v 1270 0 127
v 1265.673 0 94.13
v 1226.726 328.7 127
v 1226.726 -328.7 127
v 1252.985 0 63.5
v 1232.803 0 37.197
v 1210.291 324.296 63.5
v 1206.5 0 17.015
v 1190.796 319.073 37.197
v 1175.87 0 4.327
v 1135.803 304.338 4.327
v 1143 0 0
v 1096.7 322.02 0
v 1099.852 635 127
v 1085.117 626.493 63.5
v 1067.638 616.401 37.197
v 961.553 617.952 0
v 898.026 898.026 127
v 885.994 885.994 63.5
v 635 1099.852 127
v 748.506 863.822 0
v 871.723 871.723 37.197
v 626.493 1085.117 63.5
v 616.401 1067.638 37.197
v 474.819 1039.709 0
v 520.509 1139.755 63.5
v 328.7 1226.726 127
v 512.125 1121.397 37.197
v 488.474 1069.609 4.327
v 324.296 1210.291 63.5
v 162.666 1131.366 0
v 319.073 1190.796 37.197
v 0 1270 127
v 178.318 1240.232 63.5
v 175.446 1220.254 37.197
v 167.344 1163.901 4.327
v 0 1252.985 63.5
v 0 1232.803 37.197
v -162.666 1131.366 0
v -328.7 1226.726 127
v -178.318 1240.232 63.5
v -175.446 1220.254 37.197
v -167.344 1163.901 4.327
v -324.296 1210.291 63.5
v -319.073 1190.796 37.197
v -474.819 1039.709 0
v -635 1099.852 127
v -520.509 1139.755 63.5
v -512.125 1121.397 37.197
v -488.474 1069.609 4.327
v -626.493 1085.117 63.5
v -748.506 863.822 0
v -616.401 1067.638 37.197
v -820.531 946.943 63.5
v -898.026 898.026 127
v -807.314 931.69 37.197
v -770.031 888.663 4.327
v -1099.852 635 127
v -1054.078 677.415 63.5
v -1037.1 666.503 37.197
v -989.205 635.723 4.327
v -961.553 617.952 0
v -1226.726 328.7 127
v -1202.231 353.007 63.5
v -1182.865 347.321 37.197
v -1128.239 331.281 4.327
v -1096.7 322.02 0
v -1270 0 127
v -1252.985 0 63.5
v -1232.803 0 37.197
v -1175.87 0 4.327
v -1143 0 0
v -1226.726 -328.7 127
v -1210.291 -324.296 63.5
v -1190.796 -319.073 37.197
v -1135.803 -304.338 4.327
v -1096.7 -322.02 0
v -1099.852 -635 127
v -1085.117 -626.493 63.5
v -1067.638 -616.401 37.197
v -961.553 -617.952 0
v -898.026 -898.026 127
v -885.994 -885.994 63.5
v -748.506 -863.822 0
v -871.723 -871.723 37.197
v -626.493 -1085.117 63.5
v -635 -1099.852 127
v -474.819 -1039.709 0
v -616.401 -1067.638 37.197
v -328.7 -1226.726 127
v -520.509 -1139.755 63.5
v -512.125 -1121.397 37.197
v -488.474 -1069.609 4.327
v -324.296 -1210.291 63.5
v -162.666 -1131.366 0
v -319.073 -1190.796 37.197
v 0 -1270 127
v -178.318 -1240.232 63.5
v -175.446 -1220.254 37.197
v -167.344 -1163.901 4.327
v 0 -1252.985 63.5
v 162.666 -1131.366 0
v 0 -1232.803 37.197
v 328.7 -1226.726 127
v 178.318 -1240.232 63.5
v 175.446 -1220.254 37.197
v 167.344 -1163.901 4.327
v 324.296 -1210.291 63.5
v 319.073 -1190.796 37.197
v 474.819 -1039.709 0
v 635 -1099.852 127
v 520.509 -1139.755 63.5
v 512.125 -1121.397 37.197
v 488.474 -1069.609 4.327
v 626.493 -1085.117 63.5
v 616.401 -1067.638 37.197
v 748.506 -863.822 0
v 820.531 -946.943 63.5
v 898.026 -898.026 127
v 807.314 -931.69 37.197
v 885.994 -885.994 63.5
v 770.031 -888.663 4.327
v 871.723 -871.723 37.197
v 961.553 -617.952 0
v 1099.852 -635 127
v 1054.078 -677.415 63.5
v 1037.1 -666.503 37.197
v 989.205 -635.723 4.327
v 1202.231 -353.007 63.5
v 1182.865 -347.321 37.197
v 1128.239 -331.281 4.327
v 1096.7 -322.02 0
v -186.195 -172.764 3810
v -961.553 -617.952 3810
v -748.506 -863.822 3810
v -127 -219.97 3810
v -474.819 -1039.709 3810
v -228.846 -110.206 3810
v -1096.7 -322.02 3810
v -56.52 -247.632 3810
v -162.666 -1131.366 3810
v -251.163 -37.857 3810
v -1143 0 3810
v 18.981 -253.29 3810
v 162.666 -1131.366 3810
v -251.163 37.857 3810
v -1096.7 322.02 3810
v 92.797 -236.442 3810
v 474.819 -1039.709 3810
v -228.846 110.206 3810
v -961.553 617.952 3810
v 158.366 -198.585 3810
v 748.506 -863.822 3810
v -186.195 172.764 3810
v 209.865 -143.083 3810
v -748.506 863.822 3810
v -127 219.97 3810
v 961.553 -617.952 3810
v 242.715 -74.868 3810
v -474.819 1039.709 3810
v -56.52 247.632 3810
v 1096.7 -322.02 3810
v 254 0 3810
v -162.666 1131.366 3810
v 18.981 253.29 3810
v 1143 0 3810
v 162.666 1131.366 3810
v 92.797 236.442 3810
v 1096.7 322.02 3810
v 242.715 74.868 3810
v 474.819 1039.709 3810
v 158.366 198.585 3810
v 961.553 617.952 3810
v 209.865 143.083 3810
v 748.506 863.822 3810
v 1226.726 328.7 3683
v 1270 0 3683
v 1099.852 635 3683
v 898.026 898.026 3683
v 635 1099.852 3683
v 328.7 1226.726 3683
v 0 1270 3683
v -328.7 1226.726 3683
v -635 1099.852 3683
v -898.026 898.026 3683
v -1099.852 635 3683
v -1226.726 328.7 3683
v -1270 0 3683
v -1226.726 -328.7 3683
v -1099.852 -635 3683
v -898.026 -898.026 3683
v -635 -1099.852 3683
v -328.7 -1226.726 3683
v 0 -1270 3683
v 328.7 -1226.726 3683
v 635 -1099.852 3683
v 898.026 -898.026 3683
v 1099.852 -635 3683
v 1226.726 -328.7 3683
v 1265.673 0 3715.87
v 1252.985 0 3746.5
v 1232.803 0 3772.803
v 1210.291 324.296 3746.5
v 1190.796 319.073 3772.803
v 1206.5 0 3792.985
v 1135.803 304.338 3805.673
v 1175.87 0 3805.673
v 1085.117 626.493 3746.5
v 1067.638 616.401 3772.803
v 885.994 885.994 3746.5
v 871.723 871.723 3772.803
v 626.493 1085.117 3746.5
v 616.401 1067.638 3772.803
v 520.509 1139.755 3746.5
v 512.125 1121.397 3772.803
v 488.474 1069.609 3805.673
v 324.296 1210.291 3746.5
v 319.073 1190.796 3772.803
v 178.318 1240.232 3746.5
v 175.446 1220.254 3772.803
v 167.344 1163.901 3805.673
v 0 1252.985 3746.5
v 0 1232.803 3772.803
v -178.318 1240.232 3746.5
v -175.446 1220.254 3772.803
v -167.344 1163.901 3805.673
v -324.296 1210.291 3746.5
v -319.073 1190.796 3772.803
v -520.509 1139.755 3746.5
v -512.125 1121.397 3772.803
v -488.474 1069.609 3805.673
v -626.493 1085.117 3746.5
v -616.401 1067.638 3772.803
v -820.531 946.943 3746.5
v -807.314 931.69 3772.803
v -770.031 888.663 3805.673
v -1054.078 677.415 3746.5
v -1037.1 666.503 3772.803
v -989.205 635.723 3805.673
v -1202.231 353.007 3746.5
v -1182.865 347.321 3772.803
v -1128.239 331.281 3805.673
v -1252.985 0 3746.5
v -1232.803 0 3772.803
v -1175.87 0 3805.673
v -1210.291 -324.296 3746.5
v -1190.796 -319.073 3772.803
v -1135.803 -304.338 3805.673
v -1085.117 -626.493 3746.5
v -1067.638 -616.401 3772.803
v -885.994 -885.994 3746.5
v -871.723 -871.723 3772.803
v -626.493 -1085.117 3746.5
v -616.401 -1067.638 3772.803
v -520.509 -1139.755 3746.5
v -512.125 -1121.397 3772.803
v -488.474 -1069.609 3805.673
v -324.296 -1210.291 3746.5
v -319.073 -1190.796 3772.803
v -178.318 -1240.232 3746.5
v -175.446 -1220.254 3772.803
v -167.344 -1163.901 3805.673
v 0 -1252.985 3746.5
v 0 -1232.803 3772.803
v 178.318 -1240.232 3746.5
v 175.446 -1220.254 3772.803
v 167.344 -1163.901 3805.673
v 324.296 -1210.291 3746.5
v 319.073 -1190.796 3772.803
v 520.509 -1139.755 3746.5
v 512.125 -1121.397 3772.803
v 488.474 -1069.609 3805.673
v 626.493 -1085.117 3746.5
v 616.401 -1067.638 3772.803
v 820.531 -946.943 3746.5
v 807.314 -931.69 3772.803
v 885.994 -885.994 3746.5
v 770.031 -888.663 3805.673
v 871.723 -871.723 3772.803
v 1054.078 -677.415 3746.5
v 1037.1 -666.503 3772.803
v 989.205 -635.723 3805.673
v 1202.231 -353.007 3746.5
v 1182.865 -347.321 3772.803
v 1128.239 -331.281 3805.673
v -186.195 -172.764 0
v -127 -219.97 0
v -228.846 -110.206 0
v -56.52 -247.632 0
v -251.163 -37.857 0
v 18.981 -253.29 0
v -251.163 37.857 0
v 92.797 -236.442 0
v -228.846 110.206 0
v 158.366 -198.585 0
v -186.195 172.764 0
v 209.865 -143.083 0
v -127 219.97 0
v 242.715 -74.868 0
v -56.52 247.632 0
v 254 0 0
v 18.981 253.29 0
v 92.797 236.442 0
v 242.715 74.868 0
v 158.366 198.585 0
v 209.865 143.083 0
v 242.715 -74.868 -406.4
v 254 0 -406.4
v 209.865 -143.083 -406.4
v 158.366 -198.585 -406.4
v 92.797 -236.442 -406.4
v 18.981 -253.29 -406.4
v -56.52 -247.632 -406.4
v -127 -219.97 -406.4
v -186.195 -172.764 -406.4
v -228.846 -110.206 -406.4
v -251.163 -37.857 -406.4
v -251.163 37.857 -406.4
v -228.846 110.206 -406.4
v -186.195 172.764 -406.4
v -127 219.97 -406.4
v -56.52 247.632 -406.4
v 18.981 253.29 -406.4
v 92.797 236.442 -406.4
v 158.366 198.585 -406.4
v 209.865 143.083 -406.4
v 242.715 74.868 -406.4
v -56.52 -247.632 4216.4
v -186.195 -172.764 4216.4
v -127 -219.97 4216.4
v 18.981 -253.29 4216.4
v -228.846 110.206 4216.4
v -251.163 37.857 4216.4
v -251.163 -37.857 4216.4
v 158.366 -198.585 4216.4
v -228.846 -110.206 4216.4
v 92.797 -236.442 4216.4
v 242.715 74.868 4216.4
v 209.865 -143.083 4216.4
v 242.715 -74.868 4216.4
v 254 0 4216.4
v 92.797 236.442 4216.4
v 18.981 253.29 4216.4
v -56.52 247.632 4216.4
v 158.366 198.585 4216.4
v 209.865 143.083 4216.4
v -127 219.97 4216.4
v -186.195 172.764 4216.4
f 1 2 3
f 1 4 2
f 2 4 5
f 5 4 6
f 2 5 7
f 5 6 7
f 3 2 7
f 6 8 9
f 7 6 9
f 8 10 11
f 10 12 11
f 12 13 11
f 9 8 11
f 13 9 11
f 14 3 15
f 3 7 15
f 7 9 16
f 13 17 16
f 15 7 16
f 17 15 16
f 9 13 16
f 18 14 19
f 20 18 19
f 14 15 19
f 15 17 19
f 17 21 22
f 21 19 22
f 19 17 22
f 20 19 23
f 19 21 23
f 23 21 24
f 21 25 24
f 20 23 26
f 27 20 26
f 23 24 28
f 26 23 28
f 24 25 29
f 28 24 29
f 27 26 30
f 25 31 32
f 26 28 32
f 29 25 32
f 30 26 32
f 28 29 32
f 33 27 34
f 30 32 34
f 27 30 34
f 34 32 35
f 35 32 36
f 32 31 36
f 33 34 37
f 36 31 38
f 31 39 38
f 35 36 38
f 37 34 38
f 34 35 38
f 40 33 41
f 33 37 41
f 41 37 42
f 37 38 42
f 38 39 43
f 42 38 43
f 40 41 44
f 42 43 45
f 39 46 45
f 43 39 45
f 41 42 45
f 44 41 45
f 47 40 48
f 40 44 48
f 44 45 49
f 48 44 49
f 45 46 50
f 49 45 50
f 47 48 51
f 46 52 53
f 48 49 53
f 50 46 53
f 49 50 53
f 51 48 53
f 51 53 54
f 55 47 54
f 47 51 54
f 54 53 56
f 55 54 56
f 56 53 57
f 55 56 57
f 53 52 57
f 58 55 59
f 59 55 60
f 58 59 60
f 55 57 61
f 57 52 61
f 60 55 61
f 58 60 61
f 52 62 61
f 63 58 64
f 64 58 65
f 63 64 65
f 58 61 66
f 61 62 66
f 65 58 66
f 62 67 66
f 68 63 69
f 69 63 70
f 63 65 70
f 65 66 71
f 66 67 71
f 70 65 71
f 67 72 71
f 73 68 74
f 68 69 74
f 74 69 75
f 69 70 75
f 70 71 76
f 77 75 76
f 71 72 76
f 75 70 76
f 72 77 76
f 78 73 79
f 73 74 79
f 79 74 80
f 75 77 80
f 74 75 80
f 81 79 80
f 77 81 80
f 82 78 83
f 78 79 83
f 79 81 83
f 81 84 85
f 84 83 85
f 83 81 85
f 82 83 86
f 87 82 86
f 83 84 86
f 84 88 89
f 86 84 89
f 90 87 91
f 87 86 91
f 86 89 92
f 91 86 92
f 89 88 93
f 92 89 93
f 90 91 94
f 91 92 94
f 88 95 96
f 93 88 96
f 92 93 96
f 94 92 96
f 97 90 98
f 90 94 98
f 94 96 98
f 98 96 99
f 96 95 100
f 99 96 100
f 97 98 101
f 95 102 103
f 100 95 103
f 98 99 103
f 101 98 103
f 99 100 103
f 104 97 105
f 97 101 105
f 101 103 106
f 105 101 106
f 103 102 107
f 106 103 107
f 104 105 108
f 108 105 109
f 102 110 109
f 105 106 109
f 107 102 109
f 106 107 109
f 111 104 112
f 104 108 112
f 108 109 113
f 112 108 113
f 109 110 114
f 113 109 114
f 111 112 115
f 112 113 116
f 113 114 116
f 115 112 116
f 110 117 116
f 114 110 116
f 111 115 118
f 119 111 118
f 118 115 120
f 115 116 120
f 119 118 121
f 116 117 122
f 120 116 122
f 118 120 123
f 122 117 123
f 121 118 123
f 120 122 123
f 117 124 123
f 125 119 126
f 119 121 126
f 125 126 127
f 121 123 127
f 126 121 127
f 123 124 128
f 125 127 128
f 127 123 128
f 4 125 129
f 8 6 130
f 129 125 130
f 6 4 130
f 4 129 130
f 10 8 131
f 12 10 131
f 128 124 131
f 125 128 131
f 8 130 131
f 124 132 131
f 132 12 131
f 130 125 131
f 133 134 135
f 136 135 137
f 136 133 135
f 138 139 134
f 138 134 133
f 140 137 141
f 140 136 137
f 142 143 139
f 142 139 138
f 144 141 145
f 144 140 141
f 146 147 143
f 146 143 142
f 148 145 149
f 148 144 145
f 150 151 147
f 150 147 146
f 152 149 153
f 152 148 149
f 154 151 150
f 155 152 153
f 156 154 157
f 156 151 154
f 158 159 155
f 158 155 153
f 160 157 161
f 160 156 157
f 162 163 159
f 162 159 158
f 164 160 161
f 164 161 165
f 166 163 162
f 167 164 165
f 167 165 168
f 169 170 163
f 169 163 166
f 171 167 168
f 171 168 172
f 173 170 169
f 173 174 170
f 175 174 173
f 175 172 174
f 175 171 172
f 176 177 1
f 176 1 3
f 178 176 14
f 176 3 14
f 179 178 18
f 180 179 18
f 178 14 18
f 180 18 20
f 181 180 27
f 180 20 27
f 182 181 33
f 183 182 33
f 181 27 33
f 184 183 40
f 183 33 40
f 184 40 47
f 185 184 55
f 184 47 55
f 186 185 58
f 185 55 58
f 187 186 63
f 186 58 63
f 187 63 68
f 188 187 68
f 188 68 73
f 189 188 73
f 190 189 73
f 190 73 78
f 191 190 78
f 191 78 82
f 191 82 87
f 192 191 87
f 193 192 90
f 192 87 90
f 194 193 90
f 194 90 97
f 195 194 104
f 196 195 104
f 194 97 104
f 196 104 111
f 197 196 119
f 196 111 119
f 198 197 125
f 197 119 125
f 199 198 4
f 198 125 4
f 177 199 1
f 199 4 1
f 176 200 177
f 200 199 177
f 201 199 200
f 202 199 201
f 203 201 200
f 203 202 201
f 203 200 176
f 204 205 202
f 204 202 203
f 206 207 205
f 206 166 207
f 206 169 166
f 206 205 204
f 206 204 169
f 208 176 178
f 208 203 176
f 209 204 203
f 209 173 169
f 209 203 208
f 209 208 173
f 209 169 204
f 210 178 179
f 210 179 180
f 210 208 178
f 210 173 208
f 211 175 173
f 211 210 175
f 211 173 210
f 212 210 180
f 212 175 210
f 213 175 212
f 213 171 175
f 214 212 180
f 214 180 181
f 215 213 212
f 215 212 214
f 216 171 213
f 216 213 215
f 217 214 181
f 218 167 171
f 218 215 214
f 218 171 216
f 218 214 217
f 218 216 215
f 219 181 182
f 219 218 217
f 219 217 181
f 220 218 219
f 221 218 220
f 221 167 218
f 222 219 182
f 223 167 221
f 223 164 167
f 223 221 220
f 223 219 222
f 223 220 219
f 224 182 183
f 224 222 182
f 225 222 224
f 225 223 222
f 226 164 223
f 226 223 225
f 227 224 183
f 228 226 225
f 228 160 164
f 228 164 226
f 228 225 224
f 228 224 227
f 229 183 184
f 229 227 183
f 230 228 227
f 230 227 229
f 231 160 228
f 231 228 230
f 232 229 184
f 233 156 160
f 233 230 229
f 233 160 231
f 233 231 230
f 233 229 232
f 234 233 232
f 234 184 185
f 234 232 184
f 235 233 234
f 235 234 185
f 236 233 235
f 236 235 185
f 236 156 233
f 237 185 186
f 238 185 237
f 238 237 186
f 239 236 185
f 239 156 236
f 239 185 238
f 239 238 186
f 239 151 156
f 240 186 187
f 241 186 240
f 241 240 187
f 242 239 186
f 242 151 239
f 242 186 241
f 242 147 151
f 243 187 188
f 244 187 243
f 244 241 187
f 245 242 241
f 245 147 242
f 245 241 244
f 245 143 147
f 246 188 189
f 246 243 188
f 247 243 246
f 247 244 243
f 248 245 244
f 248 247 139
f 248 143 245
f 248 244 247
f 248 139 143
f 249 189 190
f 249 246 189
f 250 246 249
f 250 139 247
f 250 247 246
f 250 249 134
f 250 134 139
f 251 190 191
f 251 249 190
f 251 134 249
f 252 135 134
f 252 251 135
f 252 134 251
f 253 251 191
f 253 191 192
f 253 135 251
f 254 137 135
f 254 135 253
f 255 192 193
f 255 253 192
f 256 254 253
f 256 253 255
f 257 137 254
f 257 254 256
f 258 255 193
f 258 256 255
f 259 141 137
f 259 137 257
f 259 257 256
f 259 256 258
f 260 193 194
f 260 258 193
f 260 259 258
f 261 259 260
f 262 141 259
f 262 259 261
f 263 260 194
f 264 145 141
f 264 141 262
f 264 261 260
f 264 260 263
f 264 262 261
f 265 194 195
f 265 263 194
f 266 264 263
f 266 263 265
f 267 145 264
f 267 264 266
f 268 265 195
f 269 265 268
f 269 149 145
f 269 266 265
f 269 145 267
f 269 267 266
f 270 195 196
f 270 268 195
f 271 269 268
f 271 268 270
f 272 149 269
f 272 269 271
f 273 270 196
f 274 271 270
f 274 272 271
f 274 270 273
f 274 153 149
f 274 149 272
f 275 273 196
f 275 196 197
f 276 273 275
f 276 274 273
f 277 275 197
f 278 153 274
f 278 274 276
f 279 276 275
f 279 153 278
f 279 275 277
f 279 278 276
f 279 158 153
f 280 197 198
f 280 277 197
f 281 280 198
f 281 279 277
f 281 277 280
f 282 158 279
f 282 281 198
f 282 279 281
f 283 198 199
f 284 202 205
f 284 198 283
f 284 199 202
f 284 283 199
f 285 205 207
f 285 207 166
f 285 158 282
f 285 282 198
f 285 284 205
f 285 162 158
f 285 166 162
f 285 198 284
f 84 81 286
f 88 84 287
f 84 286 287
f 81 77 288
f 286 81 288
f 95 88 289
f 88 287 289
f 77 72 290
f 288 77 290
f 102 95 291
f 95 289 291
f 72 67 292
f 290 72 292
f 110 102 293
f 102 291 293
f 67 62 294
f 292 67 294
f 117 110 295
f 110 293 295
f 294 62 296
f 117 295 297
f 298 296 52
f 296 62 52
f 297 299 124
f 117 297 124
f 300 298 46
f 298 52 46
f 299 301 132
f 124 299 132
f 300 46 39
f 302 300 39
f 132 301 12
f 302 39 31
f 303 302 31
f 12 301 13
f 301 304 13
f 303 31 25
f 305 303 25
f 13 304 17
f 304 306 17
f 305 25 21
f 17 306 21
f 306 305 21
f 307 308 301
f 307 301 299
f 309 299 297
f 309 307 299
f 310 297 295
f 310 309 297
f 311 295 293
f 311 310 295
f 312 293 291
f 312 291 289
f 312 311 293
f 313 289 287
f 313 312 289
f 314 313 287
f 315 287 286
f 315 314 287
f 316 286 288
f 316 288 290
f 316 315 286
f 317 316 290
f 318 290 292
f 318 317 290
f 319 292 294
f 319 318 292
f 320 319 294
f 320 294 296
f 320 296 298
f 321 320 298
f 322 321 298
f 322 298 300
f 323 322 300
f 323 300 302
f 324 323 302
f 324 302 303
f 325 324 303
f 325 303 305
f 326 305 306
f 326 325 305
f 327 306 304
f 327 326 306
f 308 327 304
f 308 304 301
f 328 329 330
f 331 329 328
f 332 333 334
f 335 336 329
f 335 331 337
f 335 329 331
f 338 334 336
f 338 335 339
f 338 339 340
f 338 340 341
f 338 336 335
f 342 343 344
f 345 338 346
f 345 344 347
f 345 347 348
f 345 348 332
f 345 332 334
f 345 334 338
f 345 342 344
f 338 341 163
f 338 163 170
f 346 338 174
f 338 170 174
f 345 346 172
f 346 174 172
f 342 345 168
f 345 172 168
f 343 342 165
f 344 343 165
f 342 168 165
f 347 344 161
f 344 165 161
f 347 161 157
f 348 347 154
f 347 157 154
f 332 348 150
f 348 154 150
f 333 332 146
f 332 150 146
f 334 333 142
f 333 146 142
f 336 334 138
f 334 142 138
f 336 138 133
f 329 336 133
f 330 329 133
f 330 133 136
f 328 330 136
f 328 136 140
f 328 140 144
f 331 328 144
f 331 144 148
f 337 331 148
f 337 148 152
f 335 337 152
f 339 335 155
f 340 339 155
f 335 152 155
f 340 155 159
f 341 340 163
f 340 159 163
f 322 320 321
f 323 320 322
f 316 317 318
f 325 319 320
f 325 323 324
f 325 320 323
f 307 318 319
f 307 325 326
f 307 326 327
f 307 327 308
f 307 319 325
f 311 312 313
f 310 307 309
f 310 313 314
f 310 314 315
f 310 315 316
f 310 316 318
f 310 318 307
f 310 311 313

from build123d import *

# Parameters (mm, degrees)
SKETCH2_R           = 1270
BOSS_EXTRUDE1_DEPTH = 3810
SKETCH3_R           = 254
BOSS_EXTRUDE2_DEPTH = 406.4
BOSS_EXTRUDE3_START = 406.4
SKETCH4_R           = 254
BOSS_EXTRUDE3_DEPTH = 406.4
FILLET1_R           = 127


with BuildPart() as part:
    # Sketch2 → Boss-Extrude1 (new body)
    with BuildSketch(Plane.XY):
        Circle(SKETCH2_R)
    extrude(amount=BOSS_EXTRUDE1_DEPTH)

    # Sketch3 → Boss-Extrude2 (add)
    with BuildSketch(Plane.XY.offset(3810)):
        Circle(SKETCH3_R)
    extrude(amount=BOSS_EXTRUDE2_DEPTH)

    # Sketch4 → Boss-Extrude3 (add)
    with BuildSketch(Plane(origin=(0, 0, 0), x_dir=(-1, 0, 0), z_dir=(0, 0, -1)).offset(BOSS_EXTRUDE3_START)):
        with Locations(Location((0, 0, 0), (0, 0, 180))):
            Circle(SKETCH4_R)
    extrude(amount=-BOSS_EXTRUDE3_DEPTH)

    # Fillet1
    fillet1_edges = [part.edges().sort_by_distance(p)[0] for p in [
        (-1270, 0, 0),
        (-1270, 0, 3810),
    ]]
    fillet(fillet1_edges, radius=FILLET1_R)


solid = part.part
